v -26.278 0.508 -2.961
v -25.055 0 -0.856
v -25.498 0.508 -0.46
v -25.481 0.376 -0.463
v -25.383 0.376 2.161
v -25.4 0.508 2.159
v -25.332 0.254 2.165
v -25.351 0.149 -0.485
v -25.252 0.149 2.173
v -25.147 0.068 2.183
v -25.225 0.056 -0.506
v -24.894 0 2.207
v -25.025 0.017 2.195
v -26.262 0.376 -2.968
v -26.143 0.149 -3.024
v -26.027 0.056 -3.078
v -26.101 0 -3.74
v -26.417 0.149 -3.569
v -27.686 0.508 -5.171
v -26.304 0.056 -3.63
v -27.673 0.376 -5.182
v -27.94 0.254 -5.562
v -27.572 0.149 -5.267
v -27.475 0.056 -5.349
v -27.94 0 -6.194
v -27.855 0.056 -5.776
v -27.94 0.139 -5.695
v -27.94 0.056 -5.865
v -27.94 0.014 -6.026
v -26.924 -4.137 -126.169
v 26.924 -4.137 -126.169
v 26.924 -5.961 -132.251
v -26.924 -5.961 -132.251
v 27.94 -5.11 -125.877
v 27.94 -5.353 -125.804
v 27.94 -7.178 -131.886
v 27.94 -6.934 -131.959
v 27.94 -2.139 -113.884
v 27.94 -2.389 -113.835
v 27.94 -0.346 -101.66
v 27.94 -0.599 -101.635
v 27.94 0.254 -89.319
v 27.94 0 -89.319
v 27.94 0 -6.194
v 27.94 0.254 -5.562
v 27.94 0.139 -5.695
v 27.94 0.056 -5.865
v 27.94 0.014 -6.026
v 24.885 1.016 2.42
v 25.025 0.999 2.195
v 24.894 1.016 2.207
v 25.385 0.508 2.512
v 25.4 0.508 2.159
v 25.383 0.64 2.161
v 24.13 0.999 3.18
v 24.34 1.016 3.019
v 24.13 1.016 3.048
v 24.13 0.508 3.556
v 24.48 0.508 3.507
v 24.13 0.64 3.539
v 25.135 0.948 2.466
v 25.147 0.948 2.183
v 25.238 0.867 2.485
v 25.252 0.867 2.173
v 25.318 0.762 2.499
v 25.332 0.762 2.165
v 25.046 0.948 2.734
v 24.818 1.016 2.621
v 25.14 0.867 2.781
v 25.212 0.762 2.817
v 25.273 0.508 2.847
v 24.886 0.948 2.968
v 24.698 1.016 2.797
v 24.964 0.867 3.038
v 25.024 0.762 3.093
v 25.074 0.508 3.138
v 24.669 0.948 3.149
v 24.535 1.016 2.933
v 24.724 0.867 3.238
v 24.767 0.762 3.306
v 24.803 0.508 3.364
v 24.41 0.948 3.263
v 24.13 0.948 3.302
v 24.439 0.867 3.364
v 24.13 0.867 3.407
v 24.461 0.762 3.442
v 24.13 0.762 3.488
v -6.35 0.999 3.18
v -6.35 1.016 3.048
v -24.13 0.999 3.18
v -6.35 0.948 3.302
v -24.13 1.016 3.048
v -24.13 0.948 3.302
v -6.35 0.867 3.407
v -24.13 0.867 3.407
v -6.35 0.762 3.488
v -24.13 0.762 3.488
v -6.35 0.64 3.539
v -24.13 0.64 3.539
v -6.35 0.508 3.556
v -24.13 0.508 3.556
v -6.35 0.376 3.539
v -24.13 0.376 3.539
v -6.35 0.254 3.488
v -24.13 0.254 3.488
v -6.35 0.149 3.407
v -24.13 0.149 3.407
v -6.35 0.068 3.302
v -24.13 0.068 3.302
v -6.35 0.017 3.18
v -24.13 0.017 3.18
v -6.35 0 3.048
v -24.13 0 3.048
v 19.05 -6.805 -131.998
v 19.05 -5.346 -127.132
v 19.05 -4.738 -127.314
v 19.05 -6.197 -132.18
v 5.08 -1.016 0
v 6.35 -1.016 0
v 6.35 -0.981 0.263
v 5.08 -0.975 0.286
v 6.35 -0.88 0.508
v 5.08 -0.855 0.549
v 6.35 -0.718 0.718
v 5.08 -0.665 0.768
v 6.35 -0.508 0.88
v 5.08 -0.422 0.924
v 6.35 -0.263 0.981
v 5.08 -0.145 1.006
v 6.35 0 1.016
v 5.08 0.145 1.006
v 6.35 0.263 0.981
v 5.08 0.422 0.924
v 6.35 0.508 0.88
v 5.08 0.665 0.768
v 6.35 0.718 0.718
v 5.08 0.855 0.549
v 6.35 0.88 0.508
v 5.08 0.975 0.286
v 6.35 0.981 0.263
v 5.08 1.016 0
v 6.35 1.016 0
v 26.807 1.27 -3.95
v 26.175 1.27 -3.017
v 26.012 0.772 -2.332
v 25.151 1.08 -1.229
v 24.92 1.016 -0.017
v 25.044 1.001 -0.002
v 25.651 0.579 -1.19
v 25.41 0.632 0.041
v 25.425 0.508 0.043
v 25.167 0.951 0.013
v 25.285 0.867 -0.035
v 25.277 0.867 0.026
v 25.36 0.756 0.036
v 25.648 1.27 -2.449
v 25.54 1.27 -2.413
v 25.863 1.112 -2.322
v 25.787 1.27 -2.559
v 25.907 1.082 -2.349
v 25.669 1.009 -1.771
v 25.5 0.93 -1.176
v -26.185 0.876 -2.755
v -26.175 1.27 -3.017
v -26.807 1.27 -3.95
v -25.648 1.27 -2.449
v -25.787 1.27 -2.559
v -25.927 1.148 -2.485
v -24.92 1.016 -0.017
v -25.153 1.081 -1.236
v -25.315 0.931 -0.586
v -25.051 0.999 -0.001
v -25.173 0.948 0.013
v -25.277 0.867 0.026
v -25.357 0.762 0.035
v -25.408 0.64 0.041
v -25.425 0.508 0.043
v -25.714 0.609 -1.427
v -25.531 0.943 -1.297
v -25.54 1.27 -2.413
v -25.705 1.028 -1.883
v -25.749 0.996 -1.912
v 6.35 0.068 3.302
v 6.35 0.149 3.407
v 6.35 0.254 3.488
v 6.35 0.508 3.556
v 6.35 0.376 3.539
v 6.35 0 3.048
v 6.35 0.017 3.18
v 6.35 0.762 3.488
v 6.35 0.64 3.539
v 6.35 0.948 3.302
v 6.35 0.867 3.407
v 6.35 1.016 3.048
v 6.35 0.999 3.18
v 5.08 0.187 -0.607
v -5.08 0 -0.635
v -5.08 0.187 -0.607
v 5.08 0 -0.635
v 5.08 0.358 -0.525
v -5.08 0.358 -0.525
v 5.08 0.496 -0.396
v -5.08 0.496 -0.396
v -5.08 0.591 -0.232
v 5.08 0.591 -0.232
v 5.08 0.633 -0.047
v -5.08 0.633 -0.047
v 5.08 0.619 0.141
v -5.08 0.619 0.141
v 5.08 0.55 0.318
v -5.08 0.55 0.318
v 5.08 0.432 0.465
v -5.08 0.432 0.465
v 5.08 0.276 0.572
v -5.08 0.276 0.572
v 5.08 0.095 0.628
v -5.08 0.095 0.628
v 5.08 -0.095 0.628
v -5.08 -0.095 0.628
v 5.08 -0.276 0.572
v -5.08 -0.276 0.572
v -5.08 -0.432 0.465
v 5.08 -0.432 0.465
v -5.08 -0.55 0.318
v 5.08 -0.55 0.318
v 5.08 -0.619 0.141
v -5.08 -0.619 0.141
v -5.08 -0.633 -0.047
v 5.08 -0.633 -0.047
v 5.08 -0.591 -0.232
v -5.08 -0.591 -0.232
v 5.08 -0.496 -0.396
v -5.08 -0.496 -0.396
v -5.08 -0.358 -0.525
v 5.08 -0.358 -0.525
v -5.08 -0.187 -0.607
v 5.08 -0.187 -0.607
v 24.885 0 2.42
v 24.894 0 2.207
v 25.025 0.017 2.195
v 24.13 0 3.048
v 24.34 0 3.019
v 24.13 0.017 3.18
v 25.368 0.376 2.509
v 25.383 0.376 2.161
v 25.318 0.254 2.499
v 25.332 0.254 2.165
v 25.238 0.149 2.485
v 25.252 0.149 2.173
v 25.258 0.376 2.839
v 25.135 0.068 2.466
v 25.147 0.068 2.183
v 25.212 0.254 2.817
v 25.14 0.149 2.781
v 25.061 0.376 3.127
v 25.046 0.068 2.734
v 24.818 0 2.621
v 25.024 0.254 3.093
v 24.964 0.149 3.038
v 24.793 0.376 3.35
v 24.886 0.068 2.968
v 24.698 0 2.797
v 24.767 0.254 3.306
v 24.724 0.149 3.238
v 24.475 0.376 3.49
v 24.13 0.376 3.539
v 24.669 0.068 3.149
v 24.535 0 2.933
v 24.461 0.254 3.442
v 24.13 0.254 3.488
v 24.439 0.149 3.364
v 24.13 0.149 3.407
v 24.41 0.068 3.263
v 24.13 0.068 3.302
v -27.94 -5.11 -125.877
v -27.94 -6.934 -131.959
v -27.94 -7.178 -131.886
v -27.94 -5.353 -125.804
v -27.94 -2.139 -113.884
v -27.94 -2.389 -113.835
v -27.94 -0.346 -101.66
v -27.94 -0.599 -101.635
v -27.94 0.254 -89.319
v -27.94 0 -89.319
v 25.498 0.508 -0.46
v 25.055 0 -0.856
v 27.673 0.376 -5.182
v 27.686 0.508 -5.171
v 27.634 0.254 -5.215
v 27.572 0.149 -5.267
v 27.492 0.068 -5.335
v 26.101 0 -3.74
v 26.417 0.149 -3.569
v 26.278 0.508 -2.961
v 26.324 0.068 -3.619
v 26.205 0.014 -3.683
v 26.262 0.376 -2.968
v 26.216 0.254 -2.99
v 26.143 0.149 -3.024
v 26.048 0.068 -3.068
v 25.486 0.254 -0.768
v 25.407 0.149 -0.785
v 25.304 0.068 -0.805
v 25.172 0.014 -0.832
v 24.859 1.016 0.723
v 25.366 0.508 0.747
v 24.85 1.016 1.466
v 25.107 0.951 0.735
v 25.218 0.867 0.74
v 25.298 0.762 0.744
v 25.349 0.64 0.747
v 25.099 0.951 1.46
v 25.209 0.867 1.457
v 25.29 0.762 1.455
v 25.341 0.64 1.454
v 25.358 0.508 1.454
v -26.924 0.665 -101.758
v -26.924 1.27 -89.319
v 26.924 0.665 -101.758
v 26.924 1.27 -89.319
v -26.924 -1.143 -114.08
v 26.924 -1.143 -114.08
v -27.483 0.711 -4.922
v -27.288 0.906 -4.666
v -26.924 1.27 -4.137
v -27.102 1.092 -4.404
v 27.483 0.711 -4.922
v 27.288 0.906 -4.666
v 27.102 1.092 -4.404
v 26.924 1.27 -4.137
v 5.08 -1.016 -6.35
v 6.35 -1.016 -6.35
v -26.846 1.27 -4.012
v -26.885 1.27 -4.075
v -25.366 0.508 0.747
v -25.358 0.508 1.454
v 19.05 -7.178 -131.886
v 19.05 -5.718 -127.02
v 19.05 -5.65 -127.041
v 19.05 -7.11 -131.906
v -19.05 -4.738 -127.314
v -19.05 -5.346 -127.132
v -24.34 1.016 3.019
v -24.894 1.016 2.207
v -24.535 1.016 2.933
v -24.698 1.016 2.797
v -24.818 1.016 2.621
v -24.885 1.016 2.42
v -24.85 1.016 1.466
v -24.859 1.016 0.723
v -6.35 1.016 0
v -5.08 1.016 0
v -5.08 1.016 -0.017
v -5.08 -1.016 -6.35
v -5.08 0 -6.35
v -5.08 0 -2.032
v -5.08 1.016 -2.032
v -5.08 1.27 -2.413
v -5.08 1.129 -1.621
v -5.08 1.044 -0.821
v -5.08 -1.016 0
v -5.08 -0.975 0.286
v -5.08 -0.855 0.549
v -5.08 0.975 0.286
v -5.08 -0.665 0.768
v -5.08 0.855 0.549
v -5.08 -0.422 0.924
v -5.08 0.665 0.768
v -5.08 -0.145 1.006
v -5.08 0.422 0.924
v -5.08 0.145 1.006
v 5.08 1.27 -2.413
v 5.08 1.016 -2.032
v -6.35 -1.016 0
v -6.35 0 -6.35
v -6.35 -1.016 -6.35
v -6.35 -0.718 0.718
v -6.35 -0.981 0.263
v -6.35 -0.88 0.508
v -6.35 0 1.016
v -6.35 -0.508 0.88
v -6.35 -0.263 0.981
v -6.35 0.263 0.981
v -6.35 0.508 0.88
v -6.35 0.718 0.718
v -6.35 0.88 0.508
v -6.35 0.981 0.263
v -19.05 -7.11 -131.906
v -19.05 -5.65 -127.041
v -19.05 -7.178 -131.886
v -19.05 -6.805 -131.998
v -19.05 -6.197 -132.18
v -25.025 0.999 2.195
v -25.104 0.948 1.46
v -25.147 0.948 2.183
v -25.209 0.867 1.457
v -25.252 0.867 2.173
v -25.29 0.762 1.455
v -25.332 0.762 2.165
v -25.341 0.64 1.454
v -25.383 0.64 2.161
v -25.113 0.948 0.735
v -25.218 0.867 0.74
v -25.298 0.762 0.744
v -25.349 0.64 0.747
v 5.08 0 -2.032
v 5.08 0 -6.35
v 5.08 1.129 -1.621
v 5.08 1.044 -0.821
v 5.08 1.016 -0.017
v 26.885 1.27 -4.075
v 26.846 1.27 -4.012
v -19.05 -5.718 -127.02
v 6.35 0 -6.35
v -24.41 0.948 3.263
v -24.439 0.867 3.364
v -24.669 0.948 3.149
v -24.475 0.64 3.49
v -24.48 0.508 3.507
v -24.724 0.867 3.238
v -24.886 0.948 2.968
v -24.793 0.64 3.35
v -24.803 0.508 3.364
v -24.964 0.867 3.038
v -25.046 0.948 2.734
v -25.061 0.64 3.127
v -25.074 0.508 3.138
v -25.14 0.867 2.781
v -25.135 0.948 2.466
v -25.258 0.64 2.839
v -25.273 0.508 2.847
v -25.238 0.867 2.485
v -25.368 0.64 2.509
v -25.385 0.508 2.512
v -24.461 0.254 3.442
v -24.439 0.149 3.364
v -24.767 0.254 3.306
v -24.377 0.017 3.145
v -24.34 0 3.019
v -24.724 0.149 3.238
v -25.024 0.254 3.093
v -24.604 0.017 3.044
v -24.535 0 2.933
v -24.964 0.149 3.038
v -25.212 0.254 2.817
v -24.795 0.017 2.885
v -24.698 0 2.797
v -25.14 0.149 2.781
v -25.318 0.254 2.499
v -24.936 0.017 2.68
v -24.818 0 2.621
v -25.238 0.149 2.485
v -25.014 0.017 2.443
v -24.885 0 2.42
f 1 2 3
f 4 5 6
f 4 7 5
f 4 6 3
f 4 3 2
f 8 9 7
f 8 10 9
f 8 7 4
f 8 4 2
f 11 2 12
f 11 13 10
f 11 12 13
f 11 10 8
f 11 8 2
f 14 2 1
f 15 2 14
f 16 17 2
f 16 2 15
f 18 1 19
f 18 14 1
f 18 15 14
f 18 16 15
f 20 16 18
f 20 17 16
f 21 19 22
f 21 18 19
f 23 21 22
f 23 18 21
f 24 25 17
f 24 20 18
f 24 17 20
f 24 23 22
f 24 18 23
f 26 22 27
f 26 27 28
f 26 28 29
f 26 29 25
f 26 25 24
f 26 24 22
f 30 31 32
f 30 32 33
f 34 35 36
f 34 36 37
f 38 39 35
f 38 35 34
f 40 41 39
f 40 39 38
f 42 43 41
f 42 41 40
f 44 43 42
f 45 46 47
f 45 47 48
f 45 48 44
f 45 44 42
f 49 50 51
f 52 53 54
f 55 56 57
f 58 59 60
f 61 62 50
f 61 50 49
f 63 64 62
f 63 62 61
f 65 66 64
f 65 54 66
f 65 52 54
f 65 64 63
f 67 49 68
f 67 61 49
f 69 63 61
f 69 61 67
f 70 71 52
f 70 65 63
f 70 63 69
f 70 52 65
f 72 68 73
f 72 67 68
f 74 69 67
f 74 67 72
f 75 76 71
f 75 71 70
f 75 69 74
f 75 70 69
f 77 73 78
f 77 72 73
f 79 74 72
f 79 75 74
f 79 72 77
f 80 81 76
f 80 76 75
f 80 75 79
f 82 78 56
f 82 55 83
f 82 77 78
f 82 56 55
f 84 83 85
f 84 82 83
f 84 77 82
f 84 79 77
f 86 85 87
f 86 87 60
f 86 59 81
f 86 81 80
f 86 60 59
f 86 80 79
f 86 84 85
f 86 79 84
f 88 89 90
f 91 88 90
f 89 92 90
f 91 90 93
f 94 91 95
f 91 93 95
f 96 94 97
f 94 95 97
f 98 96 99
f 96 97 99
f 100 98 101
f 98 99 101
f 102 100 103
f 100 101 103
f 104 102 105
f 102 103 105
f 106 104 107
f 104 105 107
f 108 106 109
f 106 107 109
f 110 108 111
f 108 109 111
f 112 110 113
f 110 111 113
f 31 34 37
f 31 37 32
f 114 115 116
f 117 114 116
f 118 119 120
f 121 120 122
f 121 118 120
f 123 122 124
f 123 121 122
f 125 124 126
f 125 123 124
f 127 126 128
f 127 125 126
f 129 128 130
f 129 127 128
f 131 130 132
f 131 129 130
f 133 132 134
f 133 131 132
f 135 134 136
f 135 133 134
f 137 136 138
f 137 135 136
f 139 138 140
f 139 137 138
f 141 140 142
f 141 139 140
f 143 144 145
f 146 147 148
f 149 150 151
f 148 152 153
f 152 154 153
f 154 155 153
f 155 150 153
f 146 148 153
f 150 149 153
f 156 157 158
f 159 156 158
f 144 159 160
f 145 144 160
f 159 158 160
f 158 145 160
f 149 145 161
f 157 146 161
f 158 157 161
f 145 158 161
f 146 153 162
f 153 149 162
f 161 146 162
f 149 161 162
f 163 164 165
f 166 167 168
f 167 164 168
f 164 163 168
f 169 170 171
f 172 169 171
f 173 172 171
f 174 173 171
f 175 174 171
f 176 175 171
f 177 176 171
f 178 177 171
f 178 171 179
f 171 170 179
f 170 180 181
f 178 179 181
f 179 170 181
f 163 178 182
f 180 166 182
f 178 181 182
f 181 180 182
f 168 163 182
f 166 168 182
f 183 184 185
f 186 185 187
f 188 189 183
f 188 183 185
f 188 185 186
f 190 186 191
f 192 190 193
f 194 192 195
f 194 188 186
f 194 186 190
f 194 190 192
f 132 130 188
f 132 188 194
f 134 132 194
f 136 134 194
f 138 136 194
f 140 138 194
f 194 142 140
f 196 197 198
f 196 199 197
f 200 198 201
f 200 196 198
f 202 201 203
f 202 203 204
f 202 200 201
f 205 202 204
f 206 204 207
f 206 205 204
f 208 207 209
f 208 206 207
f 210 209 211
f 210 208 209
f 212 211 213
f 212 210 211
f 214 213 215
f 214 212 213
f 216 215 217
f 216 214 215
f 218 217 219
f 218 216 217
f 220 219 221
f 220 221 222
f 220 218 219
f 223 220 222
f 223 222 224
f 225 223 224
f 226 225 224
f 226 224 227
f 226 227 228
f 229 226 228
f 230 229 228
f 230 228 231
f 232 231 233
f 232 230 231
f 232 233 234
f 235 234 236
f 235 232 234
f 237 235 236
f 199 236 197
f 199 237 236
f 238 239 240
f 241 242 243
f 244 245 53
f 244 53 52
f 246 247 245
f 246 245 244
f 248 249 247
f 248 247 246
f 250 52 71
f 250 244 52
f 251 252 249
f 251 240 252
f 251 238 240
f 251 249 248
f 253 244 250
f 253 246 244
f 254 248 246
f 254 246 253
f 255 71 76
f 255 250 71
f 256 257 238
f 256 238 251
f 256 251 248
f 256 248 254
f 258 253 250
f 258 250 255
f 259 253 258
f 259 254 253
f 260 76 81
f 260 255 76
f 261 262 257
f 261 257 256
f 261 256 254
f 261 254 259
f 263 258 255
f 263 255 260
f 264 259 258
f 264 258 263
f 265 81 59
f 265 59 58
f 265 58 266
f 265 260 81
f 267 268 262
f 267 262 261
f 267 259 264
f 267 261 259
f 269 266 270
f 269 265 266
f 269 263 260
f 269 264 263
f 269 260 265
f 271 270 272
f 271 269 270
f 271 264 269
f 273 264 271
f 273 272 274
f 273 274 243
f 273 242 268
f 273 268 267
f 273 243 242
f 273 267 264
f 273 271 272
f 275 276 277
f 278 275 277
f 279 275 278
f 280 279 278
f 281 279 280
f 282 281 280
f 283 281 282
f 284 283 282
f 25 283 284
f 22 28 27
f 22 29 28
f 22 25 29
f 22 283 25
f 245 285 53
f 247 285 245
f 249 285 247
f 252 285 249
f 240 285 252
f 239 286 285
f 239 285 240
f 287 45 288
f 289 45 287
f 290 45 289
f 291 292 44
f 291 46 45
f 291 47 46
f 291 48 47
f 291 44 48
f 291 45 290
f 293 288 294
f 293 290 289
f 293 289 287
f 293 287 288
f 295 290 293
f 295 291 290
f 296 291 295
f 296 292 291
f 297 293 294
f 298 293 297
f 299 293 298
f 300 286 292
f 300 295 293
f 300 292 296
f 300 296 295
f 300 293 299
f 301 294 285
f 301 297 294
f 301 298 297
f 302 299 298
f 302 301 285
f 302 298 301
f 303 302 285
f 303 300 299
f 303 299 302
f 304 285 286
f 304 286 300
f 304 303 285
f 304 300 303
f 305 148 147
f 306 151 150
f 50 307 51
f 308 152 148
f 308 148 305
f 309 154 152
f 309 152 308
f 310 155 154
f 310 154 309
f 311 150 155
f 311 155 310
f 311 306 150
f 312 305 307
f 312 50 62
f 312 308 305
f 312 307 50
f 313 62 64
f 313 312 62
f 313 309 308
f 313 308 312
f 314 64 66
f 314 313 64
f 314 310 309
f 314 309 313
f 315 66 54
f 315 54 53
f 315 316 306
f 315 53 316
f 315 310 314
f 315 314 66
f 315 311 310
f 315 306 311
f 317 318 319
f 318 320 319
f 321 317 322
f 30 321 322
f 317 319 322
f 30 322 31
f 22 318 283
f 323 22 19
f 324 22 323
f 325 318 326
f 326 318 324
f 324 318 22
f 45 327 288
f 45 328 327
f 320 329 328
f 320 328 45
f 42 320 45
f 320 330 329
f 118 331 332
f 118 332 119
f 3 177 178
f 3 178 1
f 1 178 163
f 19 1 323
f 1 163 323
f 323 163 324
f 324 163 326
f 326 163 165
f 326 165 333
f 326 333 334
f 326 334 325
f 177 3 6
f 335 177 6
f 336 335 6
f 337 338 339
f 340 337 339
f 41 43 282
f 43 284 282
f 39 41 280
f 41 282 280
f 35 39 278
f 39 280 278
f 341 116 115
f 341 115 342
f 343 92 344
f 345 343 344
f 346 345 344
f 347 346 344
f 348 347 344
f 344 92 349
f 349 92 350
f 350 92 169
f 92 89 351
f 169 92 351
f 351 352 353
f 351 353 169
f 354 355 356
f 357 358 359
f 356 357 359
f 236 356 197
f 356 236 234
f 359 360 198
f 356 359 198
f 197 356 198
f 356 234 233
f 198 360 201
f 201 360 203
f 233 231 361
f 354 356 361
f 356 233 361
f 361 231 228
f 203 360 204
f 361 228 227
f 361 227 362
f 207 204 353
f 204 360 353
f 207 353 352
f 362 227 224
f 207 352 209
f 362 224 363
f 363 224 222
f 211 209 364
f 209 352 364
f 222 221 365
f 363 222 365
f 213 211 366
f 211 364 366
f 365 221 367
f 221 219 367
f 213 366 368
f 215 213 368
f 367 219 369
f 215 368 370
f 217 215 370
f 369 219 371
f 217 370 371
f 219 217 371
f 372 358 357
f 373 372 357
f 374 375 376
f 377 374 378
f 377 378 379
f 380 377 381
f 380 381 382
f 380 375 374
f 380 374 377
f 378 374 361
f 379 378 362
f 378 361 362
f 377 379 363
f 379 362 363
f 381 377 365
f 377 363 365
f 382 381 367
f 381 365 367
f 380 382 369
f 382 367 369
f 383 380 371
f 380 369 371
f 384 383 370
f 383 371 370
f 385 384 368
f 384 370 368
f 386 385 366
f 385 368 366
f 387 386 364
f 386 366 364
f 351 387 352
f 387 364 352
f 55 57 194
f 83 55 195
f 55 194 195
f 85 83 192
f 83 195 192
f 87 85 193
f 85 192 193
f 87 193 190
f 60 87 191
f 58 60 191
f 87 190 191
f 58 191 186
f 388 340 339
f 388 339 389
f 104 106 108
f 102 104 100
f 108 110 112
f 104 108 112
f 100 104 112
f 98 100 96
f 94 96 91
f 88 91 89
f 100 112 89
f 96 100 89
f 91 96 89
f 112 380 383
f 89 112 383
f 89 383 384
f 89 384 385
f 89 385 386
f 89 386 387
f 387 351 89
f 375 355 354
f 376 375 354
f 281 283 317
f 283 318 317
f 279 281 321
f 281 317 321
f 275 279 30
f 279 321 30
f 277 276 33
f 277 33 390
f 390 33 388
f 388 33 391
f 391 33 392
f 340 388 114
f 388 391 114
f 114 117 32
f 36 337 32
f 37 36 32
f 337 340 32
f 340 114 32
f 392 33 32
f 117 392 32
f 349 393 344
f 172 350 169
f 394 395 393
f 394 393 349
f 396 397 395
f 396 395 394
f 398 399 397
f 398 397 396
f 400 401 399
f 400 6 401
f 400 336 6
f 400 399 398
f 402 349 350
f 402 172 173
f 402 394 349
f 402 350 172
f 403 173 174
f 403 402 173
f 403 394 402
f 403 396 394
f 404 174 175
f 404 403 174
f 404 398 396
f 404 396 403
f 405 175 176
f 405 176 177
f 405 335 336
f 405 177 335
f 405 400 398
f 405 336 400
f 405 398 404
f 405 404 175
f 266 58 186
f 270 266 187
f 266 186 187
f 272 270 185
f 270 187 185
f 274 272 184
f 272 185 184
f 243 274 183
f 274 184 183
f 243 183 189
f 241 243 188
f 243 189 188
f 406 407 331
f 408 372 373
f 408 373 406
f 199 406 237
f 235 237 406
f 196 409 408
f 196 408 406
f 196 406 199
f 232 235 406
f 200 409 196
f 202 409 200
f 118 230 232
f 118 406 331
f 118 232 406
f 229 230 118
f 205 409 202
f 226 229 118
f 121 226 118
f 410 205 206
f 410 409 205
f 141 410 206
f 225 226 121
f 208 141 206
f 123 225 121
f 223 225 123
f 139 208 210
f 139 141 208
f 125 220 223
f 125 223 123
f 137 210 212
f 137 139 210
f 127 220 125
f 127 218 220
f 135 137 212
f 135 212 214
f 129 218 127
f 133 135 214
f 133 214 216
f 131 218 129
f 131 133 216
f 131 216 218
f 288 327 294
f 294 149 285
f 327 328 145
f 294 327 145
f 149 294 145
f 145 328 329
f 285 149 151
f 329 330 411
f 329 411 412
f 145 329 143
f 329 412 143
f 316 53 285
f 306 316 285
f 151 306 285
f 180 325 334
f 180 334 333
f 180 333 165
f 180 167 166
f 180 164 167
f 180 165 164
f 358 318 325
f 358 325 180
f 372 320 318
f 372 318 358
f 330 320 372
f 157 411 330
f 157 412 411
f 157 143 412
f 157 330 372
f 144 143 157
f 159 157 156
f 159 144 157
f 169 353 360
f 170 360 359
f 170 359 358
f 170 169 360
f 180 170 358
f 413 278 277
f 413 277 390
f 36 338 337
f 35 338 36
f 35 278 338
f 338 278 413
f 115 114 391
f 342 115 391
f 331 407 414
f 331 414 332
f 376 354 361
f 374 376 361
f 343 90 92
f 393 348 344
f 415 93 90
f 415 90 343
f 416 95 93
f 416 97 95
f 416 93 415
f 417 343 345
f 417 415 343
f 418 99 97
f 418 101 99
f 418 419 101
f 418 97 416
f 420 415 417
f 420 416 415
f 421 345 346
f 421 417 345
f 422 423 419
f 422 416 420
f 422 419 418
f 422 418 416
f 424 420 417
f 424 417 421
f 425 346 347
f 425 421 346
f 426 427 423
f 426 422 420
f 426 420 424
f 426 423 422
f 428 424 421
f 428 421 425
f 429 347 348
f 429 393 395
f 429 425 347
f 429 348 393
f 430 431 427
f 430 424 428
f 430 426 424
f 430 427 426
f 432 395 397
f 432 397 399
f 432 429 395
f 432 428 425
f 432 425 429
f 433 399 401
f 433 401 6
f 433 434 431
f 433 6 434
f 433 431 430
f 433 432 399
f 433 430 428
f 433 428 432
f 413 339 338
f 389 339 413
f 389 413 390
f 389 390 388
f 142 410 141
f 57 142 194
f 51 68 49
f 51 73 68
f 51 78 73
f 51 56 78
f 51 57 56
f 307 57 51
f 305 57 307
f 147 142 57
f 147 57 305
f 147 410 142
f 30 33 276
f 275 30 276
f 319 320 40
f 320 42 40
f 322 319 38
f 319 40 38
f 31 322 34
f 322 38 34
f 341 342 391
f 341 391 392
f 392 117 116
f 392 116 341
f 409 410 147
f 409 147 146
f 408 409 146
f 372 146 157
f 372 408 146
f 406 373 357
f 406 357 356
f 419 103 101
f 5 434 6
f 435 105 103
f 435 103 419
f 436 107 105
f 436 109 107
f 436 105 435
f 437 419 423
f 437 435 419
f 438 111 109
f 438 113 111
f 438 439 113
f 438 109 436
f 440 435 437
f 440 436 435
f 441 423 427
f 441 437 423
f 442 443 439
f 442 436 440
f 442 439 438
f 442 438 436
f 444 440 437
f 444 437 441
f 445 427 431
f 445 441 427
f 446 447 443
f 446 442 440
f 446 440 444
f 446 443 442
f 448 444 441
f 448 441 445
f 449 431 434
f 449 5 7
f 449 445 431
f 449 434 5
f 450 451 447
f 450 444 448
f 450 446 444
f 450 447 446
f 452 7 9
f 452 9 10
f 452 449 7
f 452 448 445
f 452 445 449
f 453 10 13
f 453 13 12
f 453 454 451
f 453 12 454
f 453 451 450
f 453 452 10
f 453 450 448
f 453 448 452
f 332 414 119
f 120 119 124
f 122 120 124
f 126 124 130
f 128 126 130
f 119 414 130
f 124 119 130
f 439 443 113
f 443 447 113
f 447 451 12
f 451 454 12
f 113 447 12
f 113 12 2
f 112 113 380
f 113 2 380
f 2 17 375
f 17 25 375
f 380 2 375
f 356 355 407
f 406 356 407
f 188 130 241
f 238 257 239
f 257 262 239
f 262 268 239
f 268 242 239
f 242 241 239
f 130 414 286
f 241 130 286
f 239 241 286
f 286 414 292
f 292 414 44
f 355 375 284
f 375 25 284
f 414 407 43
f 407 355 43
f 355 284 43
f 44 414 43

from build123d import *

# Parameters (mm, degrees)
SKETCH1_R           = 0.635
BOSS_EXTRUDE1_DEPTH = 5.08
BOSS_EXTRUDE2_DEPTH = 1.27
BOSS_EXTRUDE3_DEPTH = 27.94
CHAMFER1_SIZE       = 1.016
BOSS_EXTRUDE4_DEPTH = 7.112
CUT_EXTRUDE1_REACH  = 95.615
FILLET1_R           = 11.43
FILLET2_R           = 0.508
BOSS_EXTRUDE5_DEPTH = 6.35
SKETCH10_W          = 38.1
SKETCH10_H          = 0.635
SKETCH10_H_2        = 1.27
CUT_EXTRUDE2_DEPTH  = 5.08


# Some blends are built 0.0001 mm under size
with BuildPart() as part:
    # Sketch1 → Boss-Extrude1 (new, symmetric)
    with BuildSketch(Plane(origin=(0, 0, 0), x_dir=(0, 0, -1), z_dir=(1, 0, 0))):
        Circle(SKETCH1_R)
    extrude(amount=BOSS_EXTRUDE1_DEPTH, both=True)

    # Sketch2 → Boss-Extrude2 (add)
    with BuildSketch(Plane(origin=(5.08, 0, 0), x_dir=(0, 0, -1), z_dir=(1, 0, 0))):
        with BuildLine():
            Line((0, 1.016), (6.35, 1.016))
            Line((6.35, 1.016), (6.35, -1.016))
            Line((6.35, -1.016), (0, -1.016))
            ThreePointArc((0, -1.016), (-1.016, 0), (0, 1.016))
        make_face()
    boss_extrude2 = extrude(amount=BOSS_EXTRUDE2_DEPTH)

    # Mirror1: Boss-Extrude2 across plane
    add(boss_extrude2.mirror(Plane(origin=(0, 0, 0), x_dir=(0, 0, 1), z_dir=(1, 0, 0))))

    # Sketch4 → Boss-Extrude3 (add, symmetric)
    with BuildSketch(Plane(origin=(0, 0, 0), x_dir=(0, 0, -1), z_dir=(1, 0, 0))):
        Polygon((2.032, 1.016), (2.032, 0), (89.3191, 0), (89.3191, 1.27), (2.413, 1.27), align=None)
    extrude(amount=BOSS_EXTRUDE3_DEPTH, both=True)

    # Chamfer1
    chamfer1_edges = [part.edges().sort_by_distance(p)[0] for p in [
        (-27.94, 1.27, -45.86605),
        (27.94, 1.27, -45.86605),
    ]]
    chamfer(chamfer1_edges, length=CHAMFER1_SIZE)

    # Sketch5 → Boss-Extrude4 (add)
    with BuildSketch(Plane.XY.offset(-2.032)):
        Polygon((6.35, 1.016), (27.178, 1.016), (27.94, 0.254), (27.94, 0), (27.178, 0), (6.35, 0), align=None)
        Polygon((-27.94, 0), (-27.178, 0), (-6.35, 0), (-6.35, 1.016), (-27.178, 1.016), (-27.94, 0.254), align=None)
    extrude(amount=BOSS_EXTRUDE4_DEPTH)

    # Sketch6 → Cut-Extrude1 (cut, up to next)
    with BuildSketch(Plane(origin=(0, 1.27, 0), x_dir=(1, 0, 0), z_dir=(0, 1, 0)), mode=Mode.PRIVATE) as cut_extrude1_sk1:
        with BuildLine():
            Line((24.13, -3.556), (6.35, -3.556))
            Line((6.35, -3.556), (6.35, -5.08))
            Line((6.35, -5.08), (27.94, -5.08))
            Line((27.94, -5.08), (27.94, 5.461))
            ThreePointArc((27.94, 5.461), (25.86406568, 1.919644773), (25.4, -2.159))
            ThreePointArc((25.4, -2.159), (25.073995365, -3.138404878), (24.13, -3.556))
        make_face()
    cut_extrude1_tool1 = extrude(cut_extrude1_sk1.sketch, amount=-CUT_EXTRUDE1_REACH, mode=Mode.PRIVATE) & part.part
    # Sketch6 → Cut-Extrude1 (cut, up to next)
    with BuildSketch(Plane(origin=(0, 1.27, 0), x_dir=(1, 0, 0), z_dir=(0, 1, 0)), mode=Mode.PRIVATE) as cut_extrude1_sk2:
        with BuildLine():
            Line((-27.94, -5.08), (-27.94, 5.461))
            ThreePointArc((-27.94, 5.461), (-25.86406568, 1.919644773), (-25.4, -2.159))
            ThreePointArc((-25.4, -2.159), (-25.073995365, -3.138404878), (-24.13, -3.556))
            Line((-24.13, -3.556), (-6.35, -3.556))
            Line((-6.35, -3.556), (-6.35, -5.08))
            Line((-6.35, -5.08), (-27.94, -5.08))
        make_face()
    cut_extrude1_tool2 = extrude(cut_extrude1_sk2.sketch, amount=-CUT_EXTRUDE1_REACH, mode=Mode.PRIVATE) & part.part
    add(cut_extrude1_tool1.solids().sort_by_distance((26.091995, 1.27, -1.843668))[0], mode=Mode.SUBTRACT)
    add(cut_extrude1_tool2.solids().sort_by_distance((-27.699742, 1.27, -0.1905))[0], mode=Mode.SUBTRACT)

    # Fillet1
    # the kernel refuses this fillet: 11.43 mm, written as the material it adds along each edge
    with BuildSketch(Plane(origin=(5.08, 1.016, -2.032), x_dir=(0, 0.5547001962252287, -0.832050294337844), z_dir=(1, 0, 0))) as fillet1_piece_1_section:
        with BuildLine():
            CenterArc((4.663449523, 10.628184011), FILLET1_R, 236.309932474, 12.101492032)
            Line((-1.676773719, 1.117849146), (0, 0))
            Line((0, 0), (0.457905012, 0))
        make_face()
    fillet1_piece_1 = extrude(amount=25.860343839, mode=Mode.PRIVATE)
    fillet1_piece_1 = fillet1_piece_1 - Plane(origin=(35.272791519, 1.208479731, 1.216597173), x_dir=(-0.7393665158371048, 0, -0.6733031674208139), z_dir=(0, 1, 0)) * Cylinder(9.917667845, 59, mode=Mode.PRIVATE)
    add(fillet1_piece_1)
    with BuildSketch(Plane(origin=(-30.940343839, 1.016, -2.032), x_dir=(0, 0.5547001962260483, -0.8320502943372975), z_dir=(1, 0, 0))) as fillet1_piece_2_section:
        with BuildLine():
            CenterArc((4.663449523, 10.628184011), FILLET1_R, 236.309932474, 12.101492032)
            Line((-1.676773719, 1.117849146), (0, 0))
            Line((0, 0), (0.457905012, 0))
        make_face()
    fillet1_piece_2 = extrude(amount=25.860343839, mode=Mode.PRIVATE)
    fillet1_piece_2 = fillet1_piece_2 - Plane(origin=(-35.272791519, 1.208479731, 1.216597173), x_dir=(0.7393665158371048, 0, -0.6733031674208138), z_dir=(0, 1, 0)) * Cylinder(9.917667845, 59, mode=Mode.PRIVATE)
    add(fillet1_piece_2)

    # Fillet2
    fillet2_edges = [part.edges().sort_by_distance(p)[0] for p in [
        (-25.86406568, 0, -1.919644773),
        (-15.24, 0, 3.556),
        (-25.669565682, 1.08391662, -1.260939708),
        (-25.356203761, 1.016, 1.070232197),
        (-15.24, 1.016, 3.556),
        (25.86406568, 0, -1.919644773),
        (25.073995365, 0, 3.138404878),
        (25.669564301, 1.083916034, -1.260934355),
        (25.356203761, 1.016, 1.070232197),
        (25.073995365, 1.016, 3.138404878),
        (-25.073995365, 0, 3.138404878),
        (-25.073995365, 1.016, 3.138404878),
        (15.24, 0, 3.556),
        (15.24, 1.016, 3.556),
    ]]
    fillet(fillet2_edges, radius=FILLET2_R - 0.0001)  # a hair under: the kernel refuses the full size

    # Sweep1: sweep along a path in Sketch8
    with BuildLine(Plane(origin=(0, 0, 0), x_dir=(0, 0, -1), z_dir=(1, 0, 0))) as sweep1_path:
        ThreePointArc((89.3191, 0), (107.756716577, -1.34549632), (125.80366, -5.35347567))
    # Sketch7 → Sweep1 (sweep)
    with BuildSketch(Plane(origin=(0, 0, -89.3191), x_dir=(-1, 0, 0), z_dir=(0, 0, -1))):
        Polygon((-27.94, 0), (-27.94, 0.254), (-26.924, 1.27), (26.924, 1.27), (27.94, 0.254), (27.94, 0), align=None)
    sweep(path=sweep1_path.line)

    # Sketch9 → Boss-Extrude5 (add)
    with BuildSketch(Plane(origin=(0, -35.059237678, -116.894226193), x_dir=(-1, 0, 0), z_dir=(0, -0.28728000000000004, -0.957846648268918))):
        Polygon((-27.94, 31.013066718), (-27.94, 31.267066718), (-26.924, 32.283066718), (26.924, 32.283066718), (27.94, 31.267066718), (27.94, 31.013066718), align=None)
    extrude(amount=BOSS_EXTRUDE5_DEPTH)

    # Sketch10 → Cut-Extrude2 (cut)
    with BuildSketch(Plane(origin=(0, -36.883465678, -122.97655241), x_dir=(-1, 0, 0), z_dir=(0, -0.28727999999993675, -0.9578466482689367))):
        with Locations((0, 31.719186718)):
            Rectangle(SKETCH10_W, SKETCH10_H)
        with Locations((0, 30.449186718)):
            Rectangle(SKETCH10_W, SKETCH10_H_2)
    extrude(amount=-CUT_EXTRUDE2_DEPTH, mode=Mode.SUBTRACT)


solid = part.part
